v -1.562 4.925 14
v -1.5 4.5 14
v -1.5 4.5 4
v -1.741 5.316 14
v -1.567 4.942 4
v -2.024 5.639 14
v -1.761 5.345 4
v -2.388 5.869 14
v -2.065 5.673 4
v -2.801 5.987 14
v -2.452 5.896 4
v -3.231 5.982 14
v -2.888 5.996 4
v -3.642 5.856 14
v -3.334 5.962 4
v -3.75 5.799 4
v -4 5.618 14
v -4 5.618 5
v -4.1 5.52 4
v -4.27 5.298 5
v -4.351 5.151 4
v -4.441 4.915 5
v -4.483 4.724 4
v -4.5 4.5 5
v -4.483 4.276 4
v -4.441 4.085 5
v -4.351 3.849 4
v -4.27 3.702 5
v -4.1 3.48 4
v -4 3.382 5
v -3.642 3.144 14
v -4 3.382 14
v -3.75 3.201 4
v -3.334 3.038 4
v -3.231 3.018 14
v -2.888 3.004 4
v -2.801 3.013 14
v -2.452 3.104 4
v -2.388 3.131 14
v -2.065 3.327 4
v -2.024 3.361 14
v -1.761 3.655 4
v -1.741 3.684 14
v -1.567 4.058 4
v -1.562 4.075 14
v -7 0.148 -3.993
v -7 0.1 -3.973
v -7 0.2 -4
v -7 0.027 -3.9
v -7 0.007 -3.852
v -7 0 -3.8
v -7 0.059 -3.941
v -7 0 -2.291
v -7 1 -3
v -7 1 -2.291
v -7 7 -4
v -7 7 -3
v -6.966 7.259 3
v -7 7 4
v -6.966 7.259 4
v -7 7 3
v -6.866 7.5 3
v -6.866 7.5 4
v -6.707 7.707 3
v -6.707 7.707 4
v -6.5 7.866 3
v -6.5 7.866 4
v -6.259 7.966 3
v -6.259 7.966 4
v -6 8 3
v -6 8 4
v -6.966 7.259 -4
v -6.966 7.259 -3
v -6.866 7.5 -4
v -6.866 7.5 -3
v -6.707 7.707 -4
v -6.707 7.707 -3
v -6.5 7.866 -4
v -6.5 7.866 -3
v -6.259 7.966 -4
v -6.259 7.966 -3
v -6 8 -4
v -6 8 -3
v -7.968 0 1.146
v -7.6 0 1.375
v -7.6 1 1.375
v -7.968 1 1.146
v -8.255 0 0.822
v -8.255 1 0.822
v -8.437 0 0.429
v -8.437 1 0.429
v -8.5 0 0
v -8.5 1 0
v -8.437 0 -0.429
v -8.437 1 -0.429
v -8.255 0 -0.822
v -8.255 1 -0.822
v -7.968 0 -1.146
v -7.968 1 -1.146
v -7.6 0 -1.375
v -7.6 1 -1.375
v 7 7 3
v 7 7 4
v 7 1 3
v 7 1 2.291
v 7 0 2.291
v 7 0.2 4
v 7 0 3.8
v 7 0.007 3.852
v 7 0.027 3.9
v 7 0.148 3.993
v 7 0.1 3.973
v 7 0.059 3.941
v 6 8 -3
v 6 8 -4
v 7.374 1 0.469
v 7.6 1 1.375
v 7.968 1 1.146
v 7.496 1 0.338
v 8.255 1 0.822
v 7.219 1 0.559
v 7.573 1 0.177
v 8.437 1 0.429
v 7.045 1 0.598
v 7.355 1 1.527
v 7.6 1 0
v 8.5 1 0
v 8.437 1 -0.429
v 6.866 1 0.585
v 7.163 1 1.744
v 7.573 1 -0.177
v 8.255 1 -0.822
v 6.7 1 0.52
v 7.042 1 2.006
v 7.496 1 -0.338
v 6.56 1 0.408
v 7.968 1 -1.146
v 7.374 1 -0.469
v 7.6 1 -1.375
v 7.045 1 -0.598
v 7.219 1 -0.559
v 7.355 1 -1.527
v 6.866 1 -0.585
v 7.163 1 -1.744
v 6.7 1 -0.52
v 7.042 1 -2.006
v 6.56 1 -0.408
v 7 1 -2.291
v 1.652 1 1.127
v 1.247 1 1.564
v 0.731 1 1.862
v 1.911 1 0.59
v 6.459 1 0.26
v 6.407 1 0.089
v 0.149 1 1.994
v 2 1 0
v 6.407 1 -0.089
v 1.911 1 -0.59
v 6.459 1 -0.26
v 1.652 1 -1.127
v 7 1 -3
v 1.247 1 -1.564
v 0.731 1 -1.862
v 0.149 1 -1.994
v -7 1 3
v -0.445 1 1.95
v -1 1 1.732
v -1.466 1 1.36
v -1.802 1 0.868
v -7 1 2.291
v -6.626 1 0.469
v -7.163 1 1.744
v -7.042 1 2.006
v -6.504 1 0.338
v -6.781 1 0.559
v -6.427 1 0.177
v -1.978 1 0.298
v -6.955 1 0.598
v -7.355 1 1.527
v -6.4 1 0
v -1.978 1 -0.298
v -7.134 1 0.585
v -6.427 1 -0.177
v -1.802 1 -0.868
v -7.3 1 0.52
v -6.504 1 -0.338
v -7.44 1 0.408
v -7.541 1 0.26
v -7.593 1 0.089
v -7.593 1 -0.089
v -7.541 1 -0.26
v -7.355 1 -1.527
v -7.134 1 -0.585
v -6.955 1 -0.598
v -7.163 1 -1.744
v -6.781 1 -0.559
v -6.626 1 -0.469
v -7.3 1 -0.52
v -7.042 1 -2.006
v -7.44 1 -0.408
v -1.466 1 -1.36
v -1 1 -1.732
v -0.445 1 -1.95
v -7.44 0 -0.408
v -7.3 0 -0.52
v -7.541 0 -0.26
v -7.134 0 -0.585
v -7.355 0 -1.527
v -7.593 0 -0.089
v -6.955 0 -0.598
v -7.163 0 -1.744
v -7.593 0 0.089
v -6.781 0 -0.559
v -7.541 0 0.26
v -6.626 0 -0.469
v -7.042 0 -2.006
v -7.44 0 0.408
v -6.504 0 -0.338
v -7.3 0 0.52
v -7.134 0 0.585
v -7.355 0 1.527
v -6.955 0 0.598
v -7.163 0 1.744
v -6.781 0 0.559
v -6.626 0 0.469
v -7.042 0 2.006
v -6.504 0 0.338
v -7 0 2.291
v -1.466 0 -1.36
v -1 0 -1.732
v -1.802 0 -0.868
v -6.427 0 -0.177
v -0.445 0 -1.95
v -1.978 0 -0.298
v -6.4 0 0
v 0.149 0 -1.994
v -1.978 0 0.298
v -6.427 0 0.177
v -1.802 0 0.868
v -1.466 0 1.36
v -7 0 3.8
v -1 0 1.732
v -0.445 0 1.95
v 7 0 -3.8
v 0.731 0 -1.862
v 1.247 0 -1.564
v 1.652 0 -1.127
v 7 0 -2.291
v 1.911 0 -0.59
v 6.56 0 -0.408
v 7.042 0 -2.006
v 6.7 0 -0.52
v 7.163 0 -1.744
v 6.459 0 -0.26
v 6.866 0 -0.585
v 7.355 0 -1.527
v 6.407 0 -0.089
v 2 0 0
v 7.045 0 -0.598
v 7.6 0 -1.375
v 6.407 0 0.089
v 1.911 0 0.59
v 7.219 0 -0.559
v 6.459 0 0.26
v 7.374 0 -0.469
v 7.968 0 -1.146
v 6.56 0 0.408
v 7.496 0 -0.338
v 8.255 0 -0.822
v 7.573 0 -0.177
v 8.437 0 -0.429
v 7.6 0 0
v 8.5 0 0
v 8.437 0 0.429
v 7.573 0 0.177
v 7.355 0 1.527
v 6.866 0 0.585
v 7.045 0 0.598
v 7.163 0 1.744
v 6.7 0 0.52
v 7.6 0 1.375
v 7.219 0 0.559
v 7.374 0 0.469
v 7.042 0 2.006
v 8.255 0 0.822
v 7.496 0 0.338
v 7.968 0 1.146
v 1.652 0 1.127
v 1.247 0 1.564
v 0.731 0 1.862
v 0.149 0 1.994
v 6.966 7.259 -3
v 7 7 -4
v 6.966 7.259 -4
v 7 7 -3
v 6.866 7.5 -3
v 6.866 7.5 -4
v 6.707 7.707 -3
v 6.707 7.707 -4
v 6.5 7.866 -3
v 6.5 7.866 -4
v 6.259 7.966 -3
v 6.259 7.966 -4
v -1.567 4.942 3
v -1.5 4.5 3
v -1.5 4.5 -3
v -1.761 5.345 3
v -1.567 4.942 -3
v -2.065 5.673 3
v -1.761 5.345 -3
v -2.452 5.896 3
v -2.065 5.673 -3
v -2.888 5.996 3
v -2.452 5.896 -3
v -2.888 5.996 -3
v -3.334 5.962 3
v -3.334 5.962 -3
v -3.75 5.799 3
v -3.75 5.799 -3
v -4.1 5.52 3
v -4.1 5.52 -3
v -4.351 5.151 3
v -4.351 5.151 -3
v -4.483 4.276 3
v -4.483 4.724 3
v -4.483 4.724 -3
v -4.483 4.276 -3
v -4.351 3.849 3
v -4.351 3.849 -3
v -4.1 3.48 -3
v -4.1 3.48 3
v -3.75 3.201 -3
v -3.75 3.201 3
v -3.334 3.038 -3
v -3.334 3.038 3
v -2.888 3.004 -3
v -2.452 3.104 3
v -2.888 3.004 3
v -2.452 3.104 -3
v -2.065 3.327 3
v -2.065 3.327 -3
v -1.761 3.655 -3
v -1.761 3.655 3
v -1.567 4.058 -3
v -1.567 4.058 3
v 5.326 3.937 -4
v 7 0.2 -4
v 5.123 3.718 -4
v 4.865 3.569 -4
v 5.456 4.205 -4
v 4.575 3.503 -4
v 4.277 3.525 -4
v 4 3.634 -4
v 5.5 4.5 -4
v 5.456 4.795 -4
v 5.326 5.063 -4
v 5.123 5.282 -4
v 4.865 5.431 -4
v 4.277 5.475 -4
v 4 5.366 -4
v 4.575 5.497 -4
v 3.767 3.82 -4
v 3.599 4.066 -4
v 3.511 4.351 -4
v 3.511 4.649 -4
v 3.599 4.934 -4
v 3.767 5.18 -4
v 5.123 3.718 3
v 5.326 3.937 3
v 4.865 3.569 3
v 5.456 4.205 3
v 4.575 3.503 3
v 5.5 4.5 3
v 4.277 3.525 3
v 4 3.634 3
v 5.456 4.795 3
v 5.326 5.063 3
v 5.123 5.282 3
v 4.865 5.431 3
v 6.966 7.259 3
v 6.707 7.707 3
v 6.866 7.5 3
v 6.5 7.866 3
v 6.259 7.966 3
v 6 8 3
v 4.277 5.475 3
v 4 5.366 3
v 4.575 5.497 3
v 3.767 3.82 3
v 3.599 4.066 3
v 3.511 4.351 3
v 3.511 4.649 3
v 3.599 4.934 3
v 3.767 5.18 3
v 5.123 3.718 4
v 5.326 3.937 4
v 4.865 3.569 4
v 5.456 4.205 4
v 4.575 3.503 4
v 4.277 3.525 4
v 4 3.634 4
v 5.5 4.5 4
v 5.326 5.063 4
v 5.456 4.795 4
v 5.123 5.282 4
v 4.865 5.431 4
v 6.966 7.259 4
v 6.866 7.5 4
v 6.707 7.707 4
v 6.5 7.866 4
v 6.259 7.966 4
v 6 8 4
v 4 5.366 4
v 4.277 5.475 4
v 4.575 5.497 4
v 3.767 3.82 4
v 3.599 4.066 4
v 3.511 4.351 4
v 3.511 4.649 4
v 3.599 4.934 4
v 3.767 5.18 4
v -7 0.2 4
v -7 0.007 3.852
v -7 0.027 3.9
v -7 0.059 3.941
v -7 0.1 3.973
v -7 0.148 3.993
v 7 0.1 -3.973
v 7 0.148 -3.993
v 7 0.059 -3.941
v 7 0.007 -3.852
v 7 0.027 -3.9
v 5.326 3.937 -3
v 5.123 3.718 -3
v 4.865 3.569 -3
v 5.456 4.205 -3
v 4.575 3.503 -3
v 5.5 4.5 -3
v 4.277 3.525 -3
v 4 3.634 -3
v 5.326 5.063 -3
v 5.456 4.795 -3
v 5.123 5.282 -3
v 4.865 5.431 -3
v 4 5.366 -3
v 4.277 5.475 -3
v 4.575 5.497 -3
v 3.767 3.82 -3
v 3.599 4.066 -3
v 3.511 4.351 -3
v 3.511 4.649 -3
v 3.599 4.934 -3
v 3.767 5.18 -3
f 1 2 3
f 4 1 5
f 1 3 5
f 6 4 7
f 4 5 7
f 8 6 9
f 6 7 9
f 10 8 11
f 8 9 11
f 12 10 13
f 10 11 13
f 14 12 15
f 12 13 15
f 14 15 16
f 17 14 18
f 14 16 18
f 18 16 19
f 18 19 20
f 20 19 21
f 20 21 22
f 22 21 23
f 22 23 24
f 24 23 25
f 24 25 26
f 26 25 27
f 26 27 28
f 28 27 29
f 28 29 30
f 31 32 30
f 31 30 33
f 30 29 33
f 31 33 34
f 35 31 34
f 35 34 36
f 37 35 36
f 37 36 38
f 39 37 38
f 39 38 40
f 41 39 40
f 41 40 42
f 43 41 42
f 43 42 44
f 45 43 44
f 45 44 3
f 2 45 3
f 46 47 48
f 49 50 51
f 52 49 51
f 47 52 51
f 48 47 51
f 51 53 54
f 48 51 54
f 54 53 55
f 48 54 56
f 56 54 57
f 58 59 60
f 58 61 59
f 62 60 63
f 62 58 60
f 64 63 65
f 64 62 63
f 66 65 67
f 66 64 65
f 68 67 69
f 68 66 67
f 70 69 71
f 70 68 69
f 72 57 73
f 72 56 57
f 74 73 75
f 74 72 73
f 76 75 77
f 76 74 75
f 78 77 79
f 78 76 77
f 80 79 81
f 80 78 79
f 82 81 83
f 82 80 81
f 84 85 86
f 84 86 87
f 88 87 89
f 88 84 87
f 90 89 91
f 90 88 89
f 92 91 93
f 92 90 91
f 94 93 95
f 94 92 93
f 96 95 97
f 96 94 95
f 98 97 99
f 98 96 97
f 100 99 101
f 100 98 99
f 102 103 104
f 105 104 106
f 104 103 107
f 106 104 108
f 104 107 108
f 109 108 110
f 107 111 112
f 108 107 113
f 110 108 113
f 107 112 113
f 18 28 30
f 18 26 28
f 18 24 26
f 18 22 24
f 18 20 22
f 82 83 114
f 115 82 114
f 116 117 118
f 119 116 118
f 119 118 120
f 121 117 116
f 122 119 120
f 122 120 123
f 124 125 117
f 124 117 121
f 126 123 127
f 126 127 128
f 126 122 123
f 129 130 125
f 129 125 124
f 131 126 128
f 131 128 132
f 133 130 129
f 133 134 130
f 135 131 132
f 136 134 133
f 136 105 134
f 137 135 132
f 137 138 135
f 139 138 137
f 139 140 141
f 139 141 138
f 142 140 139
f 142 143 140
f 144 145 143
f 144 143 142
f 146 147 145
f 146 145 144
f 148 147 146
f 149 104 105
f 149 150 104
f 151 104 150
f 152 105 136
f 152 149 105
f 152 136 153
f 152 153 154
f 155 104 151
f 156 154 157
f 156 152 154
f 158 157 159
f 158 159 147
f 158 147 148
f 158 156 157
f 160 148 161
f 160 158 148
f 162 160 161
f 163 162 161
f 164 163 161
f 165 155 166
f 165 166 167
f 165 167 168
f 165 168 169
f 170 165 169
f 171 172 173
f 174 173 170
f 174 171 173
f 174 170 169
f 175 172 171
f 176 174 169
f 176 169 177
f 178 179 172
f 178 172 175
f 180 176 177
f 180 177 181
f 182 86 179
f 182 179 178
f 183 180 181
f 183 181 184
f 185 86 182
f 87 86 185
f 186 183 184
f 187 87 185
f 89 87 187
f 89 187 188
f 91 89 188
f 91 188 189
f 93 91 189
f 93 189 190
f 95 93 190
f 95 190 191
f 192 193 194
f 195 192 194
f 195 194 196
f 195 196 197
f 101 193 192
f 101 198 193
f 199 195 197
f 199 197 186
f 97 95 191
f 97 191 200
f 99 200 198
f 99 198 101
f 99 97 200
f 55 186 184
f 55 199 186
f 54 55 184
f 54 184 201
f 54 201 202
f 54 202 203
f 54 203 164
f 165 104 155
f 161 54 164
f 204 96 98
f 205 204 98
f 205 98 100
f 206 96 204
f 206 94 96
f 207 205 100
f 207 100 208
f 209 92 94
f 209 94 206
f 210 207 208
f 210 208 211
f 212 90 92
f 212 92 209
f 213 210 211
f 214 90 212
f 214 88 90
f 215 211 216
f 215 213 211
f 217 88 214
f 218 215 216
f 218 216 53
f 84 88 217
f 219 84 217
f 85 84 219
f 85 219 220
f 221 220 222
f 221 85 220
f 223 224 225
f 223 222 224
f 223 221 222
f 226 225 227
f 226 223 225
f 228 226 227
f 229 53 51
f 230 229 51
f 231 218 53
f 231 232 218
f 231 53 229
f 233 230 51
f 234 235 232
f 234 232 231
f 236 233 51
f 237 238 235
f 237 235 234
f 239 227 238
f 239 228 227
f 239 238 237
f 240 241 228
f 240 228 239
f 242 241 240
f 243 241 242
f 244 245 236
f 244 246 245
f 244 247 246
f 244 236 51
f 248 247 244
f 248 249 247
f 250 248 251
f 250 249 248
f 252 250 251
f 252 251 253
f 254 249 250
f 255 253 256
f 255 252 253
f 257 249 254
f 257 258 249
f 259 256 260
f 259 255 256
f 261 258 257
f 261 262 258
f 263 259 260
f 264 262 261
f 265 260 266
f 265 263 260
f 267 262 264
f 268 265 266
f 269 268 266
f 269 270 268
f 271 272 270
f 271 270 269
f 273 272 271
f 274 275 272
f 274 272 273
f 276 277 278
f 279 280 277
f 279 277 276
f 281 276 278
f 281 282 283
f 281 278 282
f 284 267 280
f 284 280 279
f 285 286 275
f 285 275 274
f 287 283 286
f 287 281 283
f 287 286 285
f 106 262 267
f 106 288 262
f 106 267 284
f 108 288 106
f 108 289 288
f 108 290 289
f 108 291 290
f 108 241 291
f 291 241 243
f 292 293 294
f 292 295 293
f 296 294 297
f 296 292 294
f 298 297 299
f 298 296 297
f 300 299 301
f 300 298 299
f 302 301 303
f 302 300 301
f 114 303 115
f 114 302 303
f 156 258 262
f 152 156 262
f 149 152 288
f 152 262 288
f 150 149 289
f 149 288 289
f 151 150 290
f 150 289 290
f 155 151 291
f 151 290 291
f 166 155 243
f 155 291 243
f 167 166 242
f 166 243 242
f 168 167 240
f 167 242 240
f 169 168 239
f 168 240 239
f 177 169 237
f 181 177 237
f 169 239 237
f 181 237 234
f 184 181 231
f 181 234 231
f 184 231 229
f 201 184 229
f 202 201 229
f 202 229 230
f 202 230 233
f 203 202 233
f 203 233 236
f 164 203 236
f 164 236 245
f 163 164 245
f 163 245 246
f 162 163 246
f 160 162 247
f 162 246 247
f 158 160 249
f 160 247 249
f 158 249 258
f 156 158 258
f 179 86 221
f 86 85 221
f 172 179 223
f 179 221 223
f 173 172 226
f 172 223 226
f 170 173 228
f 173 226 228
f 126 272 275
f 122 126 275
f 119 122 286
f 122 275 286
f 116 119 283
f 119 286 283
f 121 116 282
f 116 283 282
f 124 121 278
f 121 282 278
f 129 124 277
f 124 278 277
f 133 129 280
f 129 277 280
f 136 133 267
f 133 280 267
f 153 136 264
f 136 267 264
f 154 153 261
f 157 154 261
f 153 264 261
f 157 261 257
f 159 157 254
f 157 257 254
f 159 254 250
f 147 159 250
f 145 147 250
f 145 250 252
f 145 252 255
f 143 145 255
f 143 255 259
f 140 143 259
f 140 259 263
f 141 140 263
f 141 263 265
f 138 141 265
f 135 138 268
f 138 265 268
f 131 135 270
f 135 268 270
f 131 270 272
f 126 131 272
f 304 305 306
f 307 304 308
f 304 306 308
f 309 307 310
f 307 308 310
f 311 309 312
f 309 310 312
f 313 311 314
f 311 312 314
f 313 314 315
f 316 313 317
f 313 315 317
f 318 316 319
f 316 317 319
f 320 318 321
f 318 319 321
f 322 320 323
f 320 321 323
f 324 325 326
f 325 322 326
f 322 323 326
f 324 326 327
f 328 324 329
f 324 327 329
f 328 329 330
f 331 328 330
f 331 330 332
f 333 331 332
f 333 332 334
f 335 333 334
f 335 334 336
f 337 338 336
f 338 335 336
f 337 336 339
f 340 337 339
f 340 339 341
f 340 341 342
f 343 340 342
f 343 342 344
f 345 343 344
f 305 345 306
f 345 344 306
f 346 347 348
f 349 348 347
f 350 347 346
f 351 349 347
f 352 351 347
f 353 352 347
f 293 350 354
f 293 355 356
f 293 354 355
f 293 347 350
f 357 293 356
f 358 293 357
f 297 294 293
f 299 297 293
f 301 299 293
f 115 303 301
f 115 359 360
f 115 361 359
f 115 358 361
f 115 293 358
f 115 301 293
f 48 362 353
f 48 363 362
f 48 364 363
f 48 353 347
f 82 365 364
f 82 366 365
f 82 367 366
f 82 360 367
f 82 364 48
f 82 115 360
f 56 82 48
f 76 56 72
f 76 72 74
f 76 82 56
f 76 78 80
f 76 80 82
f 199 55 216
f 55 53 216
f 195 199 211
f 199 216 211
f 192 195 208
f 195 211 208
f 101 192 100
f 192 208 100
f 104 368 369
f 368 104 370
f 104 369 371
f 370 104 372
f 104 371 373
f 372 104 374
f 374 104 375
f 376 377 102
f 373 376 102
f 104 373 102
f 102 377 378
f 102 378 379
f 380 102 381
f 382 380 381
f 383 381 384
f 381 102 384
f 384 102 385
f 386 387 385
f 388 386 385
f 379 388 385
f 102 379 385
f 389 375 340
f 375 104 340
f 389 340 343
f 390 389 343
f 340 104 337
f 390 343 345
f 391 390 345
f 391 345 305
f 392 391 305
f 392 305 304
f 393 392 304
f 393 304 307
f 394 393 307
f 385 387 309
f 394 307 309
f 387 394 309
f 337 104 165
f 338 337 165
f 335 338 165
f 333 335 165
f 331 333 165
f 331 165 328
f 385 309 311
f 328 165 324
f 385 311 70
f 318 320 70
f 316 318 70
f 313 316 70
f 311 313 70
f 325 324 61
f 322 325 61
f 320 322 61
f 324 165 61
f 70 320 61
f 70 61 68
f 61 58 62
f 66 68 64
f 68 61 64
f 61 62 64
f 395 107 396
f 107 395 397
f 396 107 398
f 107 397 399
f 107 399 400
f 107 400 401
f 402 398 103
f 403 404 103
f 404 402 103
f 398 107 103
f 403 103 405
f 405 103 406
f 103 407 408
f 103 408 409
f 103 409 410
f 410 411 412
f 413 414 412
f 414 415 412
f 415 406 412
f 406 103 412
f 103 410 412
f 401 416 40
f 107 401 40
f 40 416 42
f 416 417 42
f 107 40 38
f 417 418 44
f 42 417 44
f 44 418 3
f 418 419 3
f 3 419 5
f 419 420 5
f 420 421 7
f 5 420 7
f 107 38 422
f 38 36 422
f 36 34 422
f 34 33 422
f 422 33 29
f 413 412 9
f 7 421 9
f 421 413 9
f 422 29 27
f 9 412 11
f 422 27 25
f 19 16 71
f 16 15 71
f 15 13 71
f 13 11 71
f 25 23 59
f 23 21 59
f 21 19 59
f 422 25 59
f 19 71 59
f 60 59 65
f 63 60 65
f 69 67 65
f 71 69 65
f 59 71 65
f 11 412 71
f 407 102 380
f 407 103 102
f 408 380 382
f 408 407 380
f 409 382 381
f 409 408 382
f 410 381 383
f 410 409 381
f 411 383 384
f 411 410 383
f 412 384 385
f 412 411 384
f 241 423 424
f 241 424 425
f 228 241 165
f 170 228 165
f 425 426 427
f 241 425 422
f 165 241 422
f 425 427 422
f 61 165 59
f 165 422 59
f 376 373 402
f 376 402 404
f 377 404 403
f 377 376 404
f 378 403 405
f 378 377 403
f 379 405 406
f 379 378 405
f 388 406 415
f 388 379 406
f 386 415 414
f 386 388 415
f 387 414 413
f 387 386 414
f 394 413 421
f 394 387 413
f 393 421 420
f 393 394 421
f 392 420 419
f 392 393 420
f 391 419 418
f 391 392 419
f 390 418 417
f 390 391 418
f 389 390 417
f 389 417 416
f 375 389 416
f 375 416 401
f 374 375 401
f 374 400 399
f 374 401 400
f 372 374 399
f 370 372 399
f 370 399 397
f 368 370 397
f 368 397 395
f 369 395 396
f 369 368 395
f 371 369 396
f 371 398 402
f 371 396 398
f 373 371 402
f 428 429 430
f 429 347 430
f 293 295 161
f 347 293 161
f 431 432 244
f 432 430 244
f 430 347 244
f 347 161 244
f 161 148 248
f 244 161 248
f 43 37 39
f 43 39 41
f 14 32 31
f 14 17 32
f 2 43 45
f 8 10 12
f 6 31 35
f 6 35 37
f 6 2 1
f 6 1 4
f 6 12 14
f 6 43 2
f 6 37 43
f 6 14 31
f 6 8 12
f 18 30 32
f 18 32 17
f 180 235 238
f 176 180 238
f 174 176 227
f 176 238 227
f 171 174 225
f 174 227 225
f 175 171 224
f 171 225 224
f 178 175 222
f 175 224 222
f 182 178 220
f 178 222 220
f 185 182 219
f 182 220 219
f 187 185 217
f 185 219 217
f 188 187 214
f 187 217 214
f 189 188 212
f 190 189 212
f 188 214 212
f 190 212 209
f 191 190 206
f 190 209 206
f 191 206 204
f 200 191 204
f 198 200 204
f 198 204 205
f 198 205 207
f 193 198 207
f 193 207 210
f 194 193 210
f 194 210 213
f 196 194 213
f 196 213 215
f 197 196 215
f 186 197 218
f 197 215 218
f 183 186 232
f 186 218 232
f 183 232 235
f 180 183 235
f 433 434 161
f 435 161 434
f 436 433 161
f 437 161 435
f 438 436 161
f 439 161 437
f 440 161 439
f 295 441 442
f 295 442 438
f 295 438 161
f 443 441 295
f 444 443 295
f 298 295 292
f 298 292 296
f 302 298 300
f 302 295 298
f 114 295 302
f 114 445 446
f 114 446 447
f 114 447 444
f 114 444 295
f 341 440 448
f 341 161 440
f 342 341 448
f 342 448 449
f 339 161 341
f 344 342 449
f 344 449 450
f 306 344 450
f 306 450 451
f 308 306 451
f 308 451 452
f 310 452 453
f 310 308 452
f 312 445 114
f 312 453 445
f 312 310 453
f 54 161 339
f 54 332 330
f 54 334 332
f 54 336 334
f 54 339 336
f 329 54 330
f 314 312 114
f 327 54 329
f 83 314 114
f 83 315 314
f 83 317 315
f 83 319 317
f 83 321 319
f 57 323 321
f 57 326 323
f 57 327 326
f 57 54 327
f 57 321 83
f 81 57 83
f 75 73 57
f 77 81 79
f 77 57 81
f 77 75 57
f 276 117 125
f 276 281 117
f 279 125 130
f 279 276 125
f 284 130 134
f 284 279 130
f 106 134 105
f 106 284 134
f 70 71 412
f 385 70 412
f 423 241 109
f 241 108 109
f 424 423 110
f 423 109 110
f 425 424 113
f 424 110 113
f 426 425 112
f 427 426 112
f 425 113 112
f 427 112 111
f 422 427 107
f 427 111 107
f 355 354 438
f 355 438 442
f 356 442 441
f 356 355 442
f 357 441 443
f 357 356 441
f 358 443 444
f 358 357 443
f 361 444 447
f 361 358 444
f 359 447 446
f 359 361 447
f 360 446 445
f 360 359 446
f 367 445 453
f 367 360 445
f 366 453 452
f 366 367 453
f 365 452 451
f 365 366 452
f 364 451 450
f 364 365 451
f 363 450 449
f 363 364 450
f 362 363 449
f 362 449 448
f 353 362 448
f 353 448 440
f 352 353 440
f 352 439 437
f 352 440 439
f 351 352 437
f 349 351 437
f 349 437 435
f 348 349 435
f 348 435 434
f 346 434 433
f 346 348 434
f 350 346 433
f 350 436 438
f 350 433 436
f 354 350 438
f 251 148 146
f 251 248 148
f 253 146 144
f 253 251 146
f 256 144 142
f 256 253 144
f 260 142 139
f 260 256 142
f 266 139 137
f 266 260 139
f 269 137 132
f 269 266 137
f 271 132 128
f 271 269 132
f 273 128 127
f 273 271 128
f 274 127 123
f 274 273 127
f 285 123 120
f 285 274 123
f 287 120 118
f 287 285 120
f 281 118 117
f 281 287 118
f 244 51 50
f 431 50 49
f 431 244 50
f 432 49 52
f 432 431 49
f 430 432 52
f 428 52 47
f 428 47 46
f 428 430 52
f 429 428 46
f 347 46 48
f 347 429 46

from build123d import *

# Parameters (mm, degrees)
EXTRUDE1_DEPTH      = 4
EXTRUDE2_DEPTH      = 12.357816692
EXTRUDE2_DEPTH_BACK = 12.357816692
SKETCH2_R           = 1
EXTRUDE3_DEPTH      = 12.357816692
EXTRUDE3_DEPTH_BACK = 12.357816692
SKETCH4_W           = 6
SKETCH4_H           = 8.732029078
FILLET1_R           = 0.2
FILLET2_R           = 1
EXTRUDE4_DEPTH      = 14
EXTRUDE4_DEPTH_BACK = 3
SKETCH3_R           = 1.5
EXTRUDE5_DEPTH      = 9
SKETCH6_R           = 1.5
EXTRUDE6_DEPTH      = 1
SKETCH7_R           = 0.6
EXTRUDE7_DEPTH      = 1
FILLET3_R           = 1
SKETCH8_R           = 2
EXTRUDE8_DEPTH      = 1


with BuildPart() as part:
    # Sketch1 → Extrude1 (new, symmetric)
    with BuildSketch(Plane.XY):
        Polygon((0, 0), (-7, 0), (-7, 8), (7, 8), (7, 0), align=None)
    extrude(amount=EXTRUDE1_DEPTH, both=True)

    # Sketch2 → Extrude2 (cut, two sides: drawn at the far end of the back side and taken through both)
    with BuildSketch(Plane.XY.offset(-EXTRUDE2_DEPTH_BACK)):
        with Locations((4.5, 4.5)):
            Circle(SKETCH2_R)
    extrude(amount=EXTRUDE2_DEPTH + EXTRUDE2_DEPTH_BACK, mode=Mode.SUBTRACT)

    # Sketch4 → Extrude3 (cut, two sides: drawn at the far end of the back side and taken through both)
    with BuildSketch(Plane(origin=(0, 0, 0), x_dir=(0, 0, -1), z_dir=(1, 0, 0)).offset(-EXTRUDE3_DEPTH_BACK)):
        with Locations((0, 5.366014539)):
            Rectangle(SKETCH4_W, SKETCH4_H)
    extrude(amount=EXTRUDE3_DEPTH + EXTRUDE3_DEPTH_BACK, mode=Mode.SUBTRACT)

    # Fillet1
    fillet1_edges = [part.edges().sort_by_distance(p)[0] for p in [
        (0, 0, 4),
        (0, 0, -4),
    ]]
    fillet(fillet1_edges, radius=FILLET1_R)

    # Fillet2
    fillet2_edges = [part.edges().sort_by_distance(p)[0] for p in [
        (-7, 8, -3.5),
        (7, 8, -3.5),
        (-7, 8, 3.5),
        (7, 8, 3.5),
    ]]
    fillet(fillet2_edges, radius=FILLET2_R)

    # Sketch3 → Extrude4 (add, two sides: drawn at the far end of the back side and taken through both)
    with BuildSketch(Plane.XY.offset(-EXTRUDE4_DEPTH_BACK)):
        with Locations((-3, 4.5)):
            Circle(SKETCH3_R)
    extrude(amount=EXTRUDE4_DEPTH + EXTRUDE4_DEPTH_BACK)

    # Sketch5 → Extrude5 (cut)
    with BuildSketch(Plane.XY.offset(14)):
        Polygon((-4, 4.5), (-4, 6.060686456), (-4.95644391, 6.060686456), (-4.95644391, 2.5), (-4, 2.5), align=None)
    extrude(amount=-EXTRUDE5_DEPTH, mode=Mode.SUBTRACT)

    # Sketch6 → Extrude6 (add)
    with BuildSketch(Plane.XZ):
        with Locations((-7, 0)):
            Circle(SKETCH6_R)
        with Locations((7, 0)):
            Circle(SKETCH6_R)
    extrude(amount=-EXTRUDE6_DEPTH)

    # Sketch7 → Extrude7 (cut)
    with BuildSketch(Plane.XZ):
        with Locations((-7, 0)):
            Circle(SKETCH7_R)
        with Locations((7, 0)):
            Circle(SKETCH7_R)
    extrude(amount=-EXTRUDE7_DEPTH, mode=Mode.SUBTRACT)

    # Fillet3
    fillet3_edges = [part.edges().sort_by_distance(p)[0] for p in [
        (7, 0.5, -1.5),
        (7, 0.5, 1.5),
        (-7, 0.5, 1.5),
        (-7, 0.5, -1.5),
    ]]
    fillet(fillet3_edges, radius=FILLET3_R)

    # Sketch8 → Extrude8 (cut)
    with BuildSketch(Plane.XZ):
        Circle(SKETCH8_R)
    extrude(amount=-EXTRUDE8_DEPTH, mode=Mode.SUBTRACT)


solid = part.part
